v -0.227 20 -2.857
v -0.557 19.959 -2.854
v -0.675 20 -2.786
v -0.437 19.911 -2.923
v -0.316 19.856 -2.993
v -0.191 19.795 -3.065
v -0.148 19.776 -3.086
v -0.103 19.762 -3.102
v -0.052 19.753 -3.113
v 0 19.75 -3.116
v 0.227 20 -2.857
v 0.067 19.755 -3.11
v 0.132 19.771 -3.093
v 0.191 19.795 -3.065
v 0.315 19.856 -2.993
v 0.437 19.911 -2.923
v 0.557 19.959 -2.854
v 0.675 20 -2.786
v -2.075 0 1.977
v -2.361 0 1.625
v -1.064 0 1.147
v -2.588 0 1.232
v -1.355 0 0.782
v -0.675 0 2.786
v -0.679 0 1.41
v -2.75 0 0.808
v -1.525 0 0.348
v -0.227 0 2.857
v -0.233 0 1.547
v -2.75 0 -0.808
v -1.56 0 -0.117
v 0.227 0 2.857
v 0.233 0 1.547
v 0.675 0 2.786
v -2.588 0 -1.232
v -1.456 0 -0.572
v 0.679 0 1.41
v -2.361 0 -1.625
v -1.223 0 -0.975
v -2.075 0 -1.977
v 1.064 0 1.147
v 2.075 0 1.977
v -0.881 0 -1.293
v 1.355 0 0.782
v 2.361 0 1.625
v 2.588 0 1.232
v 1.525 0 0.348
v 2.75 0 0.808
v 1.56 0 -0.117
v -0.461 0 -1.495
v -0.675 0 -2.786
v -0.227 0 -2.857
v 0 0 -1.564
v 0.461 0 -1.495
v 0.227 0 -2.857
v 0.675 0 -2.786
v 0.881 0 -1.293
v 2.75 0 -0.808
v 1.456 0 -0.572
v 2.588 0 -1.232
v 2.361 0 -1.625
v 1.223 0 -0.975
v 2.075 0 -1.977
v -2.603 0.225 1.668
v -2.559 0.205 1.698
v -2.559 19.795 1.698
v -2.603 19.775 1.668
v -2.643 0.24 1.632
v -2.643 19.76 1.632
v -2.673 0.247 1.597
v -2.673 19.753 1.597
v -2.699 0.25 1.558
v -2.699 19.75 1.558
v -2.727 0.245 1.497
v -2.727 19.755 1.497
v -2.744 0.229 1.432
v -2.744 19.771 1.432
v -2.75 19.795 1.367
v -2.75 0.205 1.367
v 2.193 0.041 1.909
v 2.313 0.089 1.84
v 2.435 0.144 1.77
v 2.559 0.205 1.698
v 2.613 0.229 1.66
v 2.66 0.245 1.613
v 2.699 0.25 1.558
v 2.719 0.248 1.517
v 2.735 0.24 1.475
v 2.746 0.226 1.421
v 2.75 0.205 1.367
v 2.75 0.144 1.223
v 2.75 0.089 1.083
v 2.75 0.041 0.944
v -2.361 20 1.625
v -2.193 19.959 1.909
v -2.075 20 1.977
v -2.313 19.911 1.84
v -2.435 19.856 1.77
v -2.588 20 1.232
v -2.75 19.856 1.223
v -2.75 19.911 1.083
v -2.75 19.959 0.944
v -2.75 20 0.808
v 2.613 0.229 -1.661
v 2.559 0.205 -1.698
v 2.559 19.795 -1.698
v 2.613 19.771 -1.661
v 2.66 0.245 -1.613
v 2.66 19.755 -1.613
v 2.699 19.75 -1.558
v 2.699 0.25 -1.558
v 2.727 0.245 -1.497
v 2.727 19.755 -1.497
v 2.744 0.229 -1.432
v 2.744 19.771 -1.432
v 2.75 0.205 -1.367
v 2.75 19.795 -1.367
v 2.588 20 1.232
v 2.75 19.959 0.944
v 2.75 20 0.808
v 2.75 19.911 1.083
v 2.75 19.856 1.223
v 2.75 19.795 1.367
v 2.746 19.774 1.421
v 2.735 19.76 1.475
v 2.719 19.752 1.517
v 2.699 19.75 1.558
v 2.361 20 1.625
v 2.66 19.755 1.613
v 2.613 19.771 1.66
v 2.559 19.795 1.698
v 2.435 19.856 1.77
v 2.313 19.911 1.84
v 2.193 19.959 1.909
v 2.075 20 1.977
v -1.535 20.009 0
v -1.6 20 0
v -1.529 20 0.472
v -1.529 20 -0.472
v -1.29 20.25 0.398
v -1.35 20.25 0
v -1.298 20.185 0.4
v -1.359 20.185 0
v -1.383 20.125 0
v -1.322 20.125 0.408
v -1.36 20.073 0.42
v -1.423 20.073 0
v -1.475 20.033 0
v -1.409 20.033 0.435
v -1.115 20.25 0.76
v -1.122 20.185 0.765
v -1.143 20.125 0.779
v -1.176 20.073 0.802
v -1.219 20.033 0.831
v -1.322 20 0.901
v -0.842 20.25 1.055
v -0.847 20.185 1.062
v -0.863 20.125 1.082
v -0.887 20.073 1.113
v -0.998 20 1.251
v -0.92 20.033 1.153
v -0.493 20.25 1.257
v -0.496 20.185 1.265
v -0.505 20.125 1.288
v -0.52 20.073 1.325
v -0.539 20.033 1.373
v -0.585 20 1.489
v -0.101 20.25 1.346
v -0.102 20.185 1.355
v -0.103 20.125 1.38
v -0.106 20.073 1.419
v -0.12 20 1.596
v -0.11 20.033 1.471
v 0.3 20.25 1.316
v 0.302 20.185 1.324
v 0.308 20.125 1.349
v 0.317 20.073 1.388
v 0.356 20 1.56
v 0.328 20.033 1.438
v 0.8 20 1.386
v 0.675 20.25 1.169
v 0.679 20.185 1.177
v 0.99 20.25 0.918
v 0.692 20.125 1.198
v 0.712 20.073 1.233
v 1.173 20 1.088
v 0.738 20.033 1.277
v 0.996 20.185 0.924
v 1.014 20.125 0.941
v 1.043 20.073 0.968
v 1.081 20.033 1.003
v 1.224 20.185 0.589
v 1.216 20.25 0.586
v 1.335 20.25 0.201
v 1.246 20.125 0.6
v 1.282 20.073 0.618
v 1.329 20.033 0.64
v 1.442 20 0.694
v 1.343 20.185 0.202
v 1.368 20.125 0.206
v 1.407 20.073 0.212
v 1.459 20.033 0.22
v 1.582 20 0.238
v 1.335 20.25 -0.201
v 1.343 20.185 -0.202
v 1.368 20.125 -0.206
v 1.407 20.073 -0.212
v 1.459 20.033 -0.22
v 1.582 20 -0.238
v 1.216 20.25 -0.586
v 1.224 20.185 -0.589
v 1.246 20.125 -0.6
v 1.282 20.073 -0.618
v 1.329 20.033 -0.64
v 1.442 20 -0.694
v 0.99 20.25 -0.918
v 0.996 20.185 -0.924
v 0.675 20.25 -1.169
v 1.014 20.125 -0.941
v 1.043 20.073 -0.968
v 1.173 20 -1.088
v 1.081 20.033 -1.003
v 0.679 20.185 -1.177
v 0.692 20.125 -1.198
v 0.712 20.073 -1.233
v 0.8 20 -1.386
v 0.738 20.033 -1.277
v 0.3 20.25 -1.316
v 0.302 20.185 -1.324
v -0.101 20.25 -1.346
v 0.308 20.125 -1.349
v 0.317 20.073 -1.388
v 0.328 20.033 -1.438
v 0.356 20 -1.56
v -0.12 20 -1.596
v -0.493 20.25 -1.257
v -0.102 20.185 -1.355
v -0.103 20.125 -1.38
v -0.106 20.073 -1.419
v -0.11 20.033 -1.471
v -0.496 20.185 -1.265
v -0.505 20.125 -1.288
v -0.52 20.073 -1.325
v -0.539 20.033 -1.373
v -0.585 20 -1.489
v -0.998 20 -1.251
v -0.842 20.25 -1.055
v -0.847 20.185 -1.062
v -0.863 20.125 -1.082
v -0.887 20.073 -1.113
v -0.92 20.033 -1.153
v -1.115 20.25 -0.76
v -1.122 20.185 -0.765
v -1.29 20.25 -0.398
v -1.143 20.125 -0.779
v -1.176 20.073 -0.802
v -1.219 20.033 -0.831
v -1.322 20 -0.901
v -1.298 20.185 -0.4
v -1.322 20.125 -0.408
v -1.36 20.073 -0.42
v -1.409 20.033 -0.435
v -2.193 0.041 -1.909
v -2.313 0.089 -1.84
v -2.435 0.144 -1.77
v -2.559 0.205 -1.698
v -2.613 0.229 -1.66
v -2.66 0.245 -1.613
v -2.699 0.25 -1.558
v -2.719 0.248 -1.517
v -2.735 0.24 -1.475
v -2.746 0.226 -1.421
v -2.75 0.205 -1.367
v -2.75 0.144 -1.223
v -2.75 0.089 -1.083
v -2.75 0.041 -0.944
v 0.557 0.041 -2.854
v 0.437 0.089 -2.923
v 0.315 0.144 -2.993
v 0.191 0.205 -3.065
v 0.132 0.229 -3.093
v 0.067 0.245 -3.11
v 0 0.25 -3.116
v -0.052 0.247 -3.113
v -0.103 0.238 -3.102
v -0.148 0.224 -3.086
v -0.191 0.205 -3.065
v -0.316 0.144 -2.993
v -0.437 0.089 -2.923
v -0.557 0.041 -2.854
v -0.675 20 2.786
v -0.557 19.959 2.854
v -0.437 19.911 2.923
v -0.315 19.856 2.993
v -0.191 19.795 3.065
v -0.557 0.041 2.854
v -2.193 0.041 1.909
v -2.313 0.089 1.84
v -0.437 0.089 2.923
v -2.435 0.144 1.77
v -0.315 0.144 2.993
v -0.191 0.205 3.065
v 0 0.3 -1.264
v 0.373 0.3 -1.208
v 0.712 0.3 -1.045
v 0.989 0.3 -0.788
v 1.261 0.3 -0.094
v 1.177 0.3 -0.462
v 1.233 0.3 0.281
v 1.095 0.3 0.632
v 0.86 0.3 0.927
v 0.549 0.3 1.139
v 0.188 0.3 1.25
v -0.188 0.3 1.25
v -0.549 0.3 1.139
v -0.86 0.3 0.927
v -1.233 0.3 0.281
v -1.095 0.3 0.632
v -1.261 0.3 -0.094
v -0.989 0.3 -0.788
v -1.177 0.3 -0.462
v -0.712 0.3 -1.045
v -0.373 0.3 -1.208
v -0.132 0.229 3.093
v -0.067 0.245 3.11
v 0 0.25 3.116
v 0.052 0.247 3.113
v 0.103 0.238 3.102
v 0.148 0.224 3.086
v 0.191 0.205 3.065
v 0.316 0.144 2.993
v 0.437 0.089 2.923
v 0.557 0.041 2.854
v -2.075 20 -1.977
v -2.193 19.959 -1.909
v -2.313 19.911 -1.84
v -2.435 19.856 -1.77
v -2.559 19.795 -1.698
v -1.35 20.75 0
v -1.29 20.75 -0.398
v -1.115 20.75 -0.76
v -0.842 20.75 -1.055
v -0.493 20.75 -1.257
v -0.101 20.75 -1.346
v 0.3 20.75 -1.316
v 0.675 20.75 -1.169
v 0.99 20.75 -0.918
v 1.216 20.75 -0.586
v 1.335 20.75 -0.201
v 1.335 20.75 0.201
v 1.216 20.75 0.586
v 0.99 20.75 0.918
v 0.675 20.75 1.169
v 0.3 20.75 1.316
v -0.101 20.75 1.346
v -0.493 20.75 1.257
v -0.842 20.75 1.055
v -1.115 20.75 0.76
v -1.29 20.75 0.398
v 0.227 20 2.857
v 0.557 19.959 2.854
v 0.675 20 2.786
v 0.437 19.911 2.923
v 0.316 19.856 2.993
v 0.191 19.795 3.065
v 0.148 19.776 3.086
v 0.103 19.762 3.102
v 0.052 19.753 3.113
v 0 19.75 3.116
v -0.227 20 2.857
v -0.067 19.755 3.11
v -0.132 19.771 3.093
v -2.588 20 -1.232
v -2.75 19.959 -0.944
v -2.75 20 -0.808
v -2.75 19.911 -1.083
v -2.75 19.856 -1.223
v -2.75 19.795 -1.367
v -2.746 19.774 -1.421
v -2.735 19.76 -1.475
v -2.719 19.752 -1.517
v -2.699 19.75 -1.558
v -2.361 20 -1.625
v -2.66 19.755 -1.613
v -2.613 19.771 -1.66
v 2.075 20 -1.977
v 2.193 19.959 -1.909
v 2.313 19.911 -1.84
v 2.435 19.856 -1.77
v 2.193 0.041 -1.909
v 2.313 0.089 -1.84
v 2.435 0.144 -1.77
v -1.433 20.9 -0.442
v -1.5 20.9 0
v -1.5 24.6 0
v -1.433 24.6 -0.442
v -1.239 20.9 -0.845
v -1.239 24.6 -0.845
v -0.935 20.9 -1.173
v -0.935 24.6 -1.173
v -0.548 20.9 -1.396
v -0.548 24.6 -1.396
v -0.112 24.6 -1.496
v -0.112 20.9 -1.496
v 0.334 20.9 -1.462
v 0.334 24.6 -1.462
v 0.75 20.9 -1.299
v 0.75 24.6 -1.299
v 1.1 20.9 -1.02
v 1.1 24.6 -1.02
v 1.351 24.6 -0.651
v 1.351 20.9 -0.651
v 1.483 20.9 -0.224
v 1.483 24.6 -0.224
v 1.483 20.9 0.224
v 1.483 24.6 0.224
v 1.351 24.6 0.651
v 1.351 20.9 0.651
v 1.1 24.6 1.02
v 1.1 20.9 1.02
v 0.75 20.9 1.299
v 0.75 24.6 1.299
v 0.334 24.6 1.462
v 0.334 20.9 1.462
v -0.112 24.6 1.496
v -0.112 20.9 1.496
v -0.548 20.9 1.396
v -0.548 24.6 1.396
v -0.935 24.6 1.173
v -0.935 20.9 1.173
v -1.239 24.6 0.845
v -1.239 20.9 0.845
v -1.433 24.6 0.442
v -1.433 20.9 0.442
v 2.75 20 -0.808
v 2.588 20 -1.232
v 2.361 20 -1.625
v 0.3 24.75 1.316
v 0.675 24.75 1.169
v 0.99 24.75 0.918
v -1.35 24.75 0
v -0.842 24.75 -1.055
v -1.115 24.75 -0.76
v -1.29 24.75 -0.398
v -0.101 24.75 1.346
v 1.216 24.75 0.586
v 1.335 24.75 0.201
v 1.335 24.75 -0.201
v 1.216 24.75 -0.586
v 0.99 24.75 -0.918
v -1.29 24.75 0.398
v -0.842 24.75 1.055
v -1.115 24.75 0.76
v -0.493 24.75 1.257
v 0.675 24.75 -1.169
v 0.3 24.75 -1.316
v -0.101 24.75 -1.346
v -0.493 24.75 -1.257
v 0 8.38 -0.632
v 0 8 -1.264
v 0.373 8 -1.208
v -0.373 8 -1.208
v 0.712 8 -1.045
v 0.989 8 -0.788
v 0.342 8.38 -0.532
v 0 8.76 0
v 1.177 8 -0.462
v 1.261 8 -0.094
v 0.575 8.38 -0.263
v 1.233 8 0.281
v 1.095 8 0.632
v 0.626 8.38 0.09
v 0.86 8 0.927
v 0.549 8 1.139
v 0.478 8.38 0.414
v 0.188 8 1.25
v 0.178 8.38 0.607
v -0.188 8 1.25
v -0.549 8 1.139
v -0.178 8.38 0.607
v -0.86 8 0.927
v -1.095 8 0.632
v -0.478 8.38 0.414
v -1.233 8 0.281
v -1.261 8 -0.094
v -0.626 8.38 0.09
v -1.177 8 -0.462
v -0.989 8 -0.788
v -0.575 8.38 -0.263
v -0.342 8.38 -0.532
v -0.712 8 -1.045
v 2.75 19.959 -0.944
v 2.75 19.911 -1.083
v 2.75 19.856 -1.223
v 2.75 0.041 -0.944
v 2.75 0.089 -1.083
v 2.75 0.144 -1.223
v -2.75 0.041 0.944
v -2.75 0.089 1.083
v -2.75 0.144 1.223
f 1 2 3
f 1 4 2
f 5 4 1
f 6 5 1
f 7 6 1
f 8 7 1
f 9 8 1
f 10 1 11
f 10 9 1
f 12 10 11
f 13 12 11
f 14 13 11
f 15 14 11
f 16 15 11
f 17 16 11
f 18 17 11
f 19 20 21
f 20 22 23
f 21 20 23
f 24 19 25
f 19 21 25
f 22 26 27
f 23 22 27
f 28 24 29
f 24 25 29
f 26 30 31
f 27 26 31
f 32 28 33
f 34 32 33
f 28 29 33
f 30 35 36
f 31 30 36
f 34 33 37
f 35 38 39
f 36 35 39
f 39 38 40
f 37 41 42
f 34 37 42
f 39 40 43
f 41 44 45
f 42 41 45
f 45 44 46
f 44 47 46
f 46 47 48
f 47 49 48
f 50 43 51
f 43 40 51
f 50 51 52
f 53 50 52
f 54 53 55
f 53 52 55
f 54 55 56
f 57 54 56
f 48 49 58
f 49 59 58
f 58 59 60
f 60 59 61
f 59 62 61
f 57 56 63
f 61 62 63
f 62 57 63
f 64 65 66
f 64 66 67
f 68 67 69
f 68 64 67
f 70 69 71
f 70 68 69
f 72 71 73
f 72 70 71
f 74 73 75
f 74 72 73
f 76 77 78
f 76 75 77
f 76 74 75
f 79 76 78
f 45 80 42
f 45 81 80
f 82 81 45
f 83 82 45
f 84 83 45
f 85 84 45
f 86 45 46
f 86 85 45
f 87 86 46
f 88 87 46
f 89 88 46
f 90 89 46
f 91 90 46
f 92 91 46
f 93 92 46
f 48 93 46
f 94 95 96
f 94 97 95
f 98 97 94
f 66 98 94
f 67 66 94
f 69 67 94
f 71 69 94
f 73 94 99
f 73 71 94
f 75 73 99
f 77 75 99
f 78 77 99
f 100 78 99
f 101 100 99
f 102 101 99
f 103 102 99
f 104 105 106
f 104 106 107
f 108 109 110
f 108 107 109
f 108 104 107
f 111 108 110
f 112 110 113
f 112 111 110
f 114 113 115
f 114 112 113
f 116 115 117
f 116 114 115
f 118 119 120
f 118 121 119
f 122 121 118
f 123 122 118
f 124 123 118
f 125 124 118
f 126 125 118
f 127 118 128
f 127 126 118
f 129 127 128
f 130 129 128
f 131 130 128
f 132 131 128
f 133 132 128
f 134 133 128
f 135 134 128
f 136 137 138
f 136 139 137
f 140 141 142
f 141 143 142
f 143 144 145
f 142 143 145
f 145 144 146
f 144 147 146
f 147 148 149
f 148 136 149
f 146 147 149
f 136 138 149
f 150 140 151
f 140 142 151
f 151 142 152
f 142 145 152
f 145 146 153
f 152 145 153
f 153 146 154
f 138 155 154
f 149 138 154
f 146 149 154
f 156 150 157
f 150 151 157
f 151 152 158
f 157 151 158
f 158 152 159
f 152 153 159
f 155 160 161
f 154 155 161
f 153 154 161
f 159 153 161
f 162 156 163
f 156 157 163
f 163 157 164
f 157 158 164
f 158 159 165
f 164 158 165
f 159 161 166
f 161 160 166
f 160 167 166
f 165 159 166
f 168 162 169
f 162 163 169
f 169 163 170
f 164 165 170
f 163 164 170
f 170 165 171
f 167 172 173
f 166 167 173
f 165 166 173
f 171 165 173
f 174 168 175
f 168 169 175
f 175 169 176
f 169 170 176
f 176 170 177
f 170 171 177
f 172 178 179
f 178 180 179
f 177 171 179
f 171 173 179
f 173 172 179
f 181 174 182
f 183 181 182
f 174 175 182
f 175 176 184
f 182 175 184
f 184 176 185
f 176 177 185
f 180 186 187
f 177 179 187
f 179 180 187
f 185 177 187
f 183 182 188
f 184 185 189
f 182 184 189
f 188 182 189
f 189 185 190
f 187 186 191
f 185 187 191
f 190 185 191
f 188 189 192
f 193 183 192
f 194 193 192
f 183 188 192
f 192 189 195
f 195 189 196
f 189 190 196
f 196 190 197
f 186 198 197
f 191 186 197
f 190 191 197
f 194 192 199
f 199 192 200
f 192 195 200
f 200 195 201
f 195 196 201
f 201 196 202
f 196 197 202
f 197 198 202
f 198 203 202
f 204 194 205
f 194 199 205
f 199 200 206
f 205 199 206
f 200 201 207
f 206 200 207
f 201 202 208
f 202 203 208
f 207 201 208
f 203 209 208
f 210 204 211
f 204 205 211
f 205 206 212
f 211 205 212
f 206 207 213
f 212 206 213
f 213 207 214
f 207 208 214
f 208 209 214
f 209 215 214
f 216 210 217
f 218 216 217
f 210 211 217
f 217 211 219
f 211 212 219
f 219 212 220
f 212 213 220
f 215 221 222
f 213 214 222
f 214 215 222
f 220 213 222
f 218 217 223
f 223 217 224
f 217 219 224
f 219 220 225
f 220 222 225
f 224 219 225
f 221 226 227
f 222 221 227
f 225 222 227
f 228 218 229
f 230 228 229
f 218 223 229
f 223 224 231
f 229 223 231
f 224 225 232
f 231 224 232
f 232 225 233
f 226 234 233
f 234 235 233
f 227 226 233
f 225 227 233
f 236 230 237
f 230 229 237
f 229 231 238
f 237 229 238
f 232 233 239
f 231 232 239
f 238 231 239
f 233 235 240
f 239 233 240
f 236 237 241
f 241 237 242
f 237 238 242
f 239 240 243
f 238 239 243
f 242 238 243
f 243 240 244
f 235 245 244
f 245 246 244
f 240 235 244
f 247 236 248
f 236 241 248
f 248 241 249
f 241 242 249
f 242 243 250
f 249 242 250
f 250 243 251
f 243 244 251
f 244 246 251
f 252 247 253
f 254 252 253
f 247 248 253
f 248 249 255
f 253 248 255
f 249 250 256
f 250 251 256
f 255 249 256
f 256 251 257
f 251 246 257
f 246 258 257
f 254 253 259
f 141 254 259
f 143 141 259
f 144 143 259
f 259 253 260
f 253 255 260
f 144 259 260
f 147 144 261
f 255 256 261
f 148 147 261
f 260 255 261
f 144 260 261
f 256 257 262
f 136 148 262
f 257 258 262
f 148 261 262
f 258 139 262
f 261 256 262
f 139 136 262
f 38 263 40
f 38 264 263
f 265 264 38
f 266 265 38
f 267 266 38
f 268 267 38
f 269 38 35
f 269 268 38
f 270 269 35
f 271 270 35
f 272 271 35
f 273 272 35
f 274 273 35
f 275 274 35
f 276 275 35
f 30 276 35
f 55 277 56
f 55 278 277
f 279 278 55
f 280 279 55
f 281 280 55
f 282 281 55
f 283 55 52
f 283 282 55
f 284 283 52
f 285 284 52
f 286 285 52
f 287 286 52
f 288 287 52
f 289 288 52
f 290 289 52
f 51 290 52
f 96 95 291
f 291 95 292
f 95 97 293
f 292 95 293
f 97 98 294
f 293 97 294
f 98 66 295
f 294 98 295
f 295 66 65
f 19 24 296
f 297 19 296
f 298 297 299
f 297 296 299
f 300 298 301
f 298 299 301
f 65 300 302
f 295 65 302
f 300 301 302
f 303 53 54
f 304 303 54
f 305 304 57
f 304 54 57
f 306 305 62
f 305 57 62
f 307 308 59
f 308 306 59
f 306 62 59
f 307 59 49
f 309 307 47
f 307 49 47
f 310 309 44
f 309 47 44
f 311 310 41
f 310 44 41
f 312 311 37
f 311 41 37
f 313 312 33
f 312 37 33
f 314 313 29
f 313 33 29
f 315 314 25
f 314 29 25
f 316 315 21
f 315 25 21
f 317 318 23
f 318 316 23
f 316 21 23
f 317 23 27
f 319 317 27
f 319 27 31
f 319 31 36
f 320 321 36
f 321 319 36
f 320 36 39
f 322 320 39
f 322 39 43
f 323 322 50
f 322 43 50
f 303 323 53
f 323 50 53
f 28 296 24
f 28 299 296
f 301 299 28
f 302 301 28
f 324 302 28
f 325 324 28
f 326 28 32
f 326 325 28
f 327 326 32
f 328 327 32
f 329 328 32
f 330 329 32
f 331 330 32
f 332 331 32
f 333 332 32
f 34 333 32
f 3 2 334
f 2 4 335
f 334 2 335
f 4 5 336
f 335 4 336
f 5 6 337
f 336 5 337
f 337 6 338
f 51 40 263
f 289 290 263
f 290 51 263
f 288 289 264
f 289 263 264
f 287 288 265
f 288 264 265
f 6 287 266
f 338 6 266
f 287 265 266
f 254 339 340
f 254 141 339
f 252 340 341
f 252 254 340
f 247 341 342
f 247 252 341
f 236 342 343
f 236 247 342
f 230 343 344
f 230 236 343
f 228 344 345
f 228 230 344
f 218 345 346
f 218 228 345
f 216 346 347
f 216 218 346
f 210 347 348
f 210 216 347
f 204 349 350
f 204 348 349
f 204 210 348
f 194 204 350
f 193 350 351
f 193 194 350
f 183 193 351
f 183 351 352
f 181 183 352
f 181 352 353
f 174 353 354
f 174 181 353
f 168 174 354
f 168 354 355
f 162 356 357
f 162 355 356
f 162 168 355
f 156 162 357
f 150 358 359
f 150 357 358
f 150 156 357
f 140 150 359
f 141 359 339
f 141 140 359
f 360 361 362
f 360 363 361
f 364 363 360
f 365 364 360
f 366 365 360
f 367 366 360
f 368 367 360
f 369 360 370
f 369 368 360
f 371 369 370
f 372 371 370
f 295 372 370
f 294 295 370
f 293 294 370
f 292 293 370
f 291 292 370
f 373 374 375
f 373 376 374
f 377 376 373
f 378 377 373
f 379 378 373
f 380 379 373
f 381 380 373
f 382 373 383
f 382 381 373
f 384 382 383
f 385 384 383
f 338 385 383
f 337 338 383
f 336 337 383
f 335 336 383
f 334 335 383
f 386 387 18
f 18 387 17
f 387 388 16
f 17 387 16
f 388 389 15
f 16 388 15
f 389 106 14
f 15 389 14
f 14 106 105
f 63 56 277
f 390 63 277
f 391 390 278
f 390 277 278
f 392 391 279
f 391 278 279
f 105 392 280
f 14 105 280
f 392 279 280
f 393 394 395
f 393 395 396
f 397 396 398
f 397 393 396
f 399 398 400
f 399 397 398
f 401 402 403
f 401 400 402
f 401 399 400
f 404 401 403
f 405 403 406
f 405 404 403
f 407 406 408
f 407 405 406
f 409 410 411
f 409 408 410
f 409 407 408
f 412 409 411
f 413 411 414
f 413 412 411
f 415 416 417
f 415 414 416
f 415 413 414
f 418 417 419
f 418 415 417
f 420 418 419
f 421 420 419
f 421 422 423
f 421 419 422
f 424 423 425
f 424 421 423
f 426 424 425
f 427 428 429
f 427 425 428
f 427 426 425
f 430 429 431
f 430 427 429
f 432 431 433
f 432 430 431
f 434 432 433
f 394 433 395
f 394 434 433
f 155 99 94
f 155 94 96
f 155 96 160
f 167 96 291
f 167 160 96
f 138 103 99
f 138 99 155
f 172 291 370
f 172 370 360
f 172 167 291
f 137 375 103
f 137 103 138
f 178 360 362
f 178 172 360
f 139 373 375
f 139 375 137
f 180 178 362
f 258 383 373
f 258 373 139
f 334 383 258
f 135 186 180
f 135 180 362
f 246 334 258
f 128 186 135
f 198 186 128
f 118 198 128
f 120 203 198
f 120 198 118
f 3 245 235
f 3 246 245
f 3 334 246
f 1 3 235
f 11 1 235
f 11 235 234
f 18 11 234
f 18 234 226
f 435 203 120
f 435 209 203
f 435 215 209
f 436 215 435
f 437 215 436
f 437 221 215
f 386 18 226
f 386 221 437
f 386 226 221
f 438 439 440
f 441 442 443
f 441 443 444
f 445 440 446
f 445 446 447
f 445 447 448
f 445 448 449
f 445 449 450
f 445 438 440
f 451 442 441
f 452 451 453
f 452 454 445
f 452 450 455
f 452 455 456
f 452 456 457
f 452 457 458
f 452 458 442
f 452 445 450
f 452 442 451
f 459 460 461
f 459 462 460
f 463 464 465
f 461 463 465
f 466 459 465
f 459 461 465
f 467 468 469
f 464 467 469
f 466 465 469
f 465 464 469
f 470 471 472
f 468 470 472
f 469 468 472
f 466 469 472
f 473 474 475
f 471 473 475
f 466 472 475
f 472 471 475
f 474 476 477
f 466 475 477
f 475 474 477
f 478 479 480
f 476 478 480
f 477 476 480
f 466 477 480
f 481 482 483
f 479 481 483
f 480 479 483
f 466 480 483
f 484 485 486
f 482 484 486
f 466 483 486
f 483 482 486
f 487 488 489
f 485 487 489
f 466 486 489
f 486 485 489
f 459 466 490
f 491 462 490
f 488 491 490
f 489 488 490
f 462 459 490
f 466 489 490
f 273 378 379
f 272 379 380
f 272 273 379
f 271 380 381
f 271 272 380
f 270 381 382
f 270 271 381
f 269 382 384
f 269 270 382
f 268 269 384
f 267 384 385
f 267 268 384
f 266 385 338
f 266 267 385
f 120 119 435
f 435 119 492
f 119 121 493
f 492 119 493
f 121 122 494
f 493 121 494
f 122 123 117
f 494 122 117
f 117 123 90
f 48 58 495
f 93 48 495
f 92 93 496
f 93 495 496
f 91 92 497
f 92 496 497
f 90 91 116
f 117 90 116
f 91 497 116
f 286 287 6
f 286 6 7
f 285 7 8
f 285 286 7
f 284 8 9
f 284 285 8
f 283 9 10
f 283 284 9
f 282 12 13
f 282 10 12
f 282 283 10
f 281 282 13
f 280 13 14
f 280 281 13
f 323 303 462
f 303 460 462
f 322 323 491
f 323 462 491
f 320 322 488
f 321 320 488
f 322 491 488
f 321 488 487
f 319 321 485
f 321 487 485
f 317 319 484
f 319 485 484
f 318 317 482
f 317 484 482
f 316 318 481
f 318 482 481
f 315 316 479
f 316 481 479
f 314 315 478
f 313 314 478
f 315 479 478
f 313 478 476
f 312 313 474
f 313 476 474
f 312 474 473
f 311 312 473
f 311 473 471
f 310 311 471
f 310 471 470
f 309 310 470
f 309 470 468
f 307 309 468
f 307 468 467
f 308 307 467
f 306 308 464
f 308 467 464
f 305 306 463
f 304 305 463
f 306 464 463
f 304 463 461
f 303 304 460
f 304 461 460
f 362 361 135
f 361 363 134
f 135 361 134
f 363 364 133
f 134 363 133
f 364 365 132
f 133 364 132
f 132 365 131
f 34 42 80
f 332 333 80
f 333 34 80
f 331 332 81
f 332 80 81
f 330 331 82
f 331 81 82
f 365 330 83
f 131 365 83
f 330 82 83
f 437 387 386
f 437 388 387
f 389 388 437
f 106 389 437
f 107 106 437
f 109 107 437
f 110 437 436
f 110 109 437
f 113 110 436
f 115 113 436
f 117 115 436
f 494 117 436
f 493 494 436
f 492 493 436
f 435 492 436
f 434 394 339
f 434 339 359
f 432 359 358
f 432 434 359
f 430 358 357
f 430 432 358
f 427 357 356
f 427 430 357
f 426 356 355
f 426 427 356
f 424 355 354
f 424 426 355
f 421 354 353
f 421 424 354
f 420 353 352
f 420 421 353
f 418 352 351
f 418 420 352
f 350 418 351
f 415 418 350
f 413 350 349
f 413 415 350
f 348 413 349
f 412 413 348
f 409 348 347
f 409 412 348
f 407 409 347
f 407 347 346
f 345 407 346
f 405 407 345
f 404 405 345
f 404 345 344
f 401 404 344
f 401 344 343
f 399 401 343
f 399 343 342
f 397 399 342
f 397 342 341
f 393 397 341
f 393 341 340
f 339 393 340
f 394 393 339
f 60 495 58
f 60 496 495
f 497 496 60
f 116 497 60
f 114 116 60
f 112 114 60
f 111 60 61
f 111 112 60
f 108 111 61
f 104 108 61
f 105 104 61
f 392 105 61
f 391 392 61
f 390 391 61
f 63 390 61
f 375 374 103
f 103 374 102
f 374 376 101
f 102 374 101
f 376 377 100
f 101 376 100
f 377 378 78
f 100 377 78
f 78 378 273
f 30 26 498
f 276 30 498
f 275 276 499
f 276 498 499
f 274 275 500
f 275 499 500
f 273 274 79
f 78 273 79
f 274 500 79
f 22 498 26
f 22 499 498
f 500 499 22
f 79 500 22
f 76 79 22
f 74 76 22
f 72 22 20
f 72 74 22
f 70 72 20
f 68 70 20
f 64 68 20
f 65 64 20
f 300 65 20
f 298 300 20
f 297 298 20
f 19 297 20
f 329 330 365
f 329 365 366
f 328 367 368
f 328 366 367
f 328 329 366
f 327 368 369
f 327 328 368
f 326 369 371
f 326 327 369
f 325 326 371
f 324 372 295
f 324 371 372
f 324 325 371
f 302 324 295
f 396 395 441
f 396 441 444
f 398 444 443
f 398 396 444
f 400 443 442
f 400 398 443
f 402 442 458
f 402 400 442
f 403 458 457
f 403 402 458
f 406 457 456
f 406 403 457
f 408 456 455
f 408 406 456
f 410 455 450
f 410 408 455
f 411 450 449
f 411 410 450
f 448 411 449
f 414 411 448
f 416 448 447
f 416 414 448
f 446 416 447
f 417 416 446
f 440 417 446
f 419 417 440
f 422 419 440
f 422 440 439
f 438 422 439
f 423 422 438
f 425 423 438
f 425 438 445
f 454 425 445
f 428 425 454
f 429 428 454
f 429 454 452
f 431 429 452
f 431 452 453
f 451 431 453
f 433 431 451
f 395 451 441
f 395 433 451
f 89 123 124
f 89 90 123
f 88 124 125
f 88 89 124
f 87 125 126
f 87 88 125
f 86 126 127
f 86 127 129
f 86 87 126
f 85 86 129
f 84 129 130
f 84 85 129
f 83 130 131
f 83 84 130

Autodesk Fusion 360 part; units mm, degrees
sketch "M3 Standoff Profile" plane through (0, 0, 0) normal (0, 1, 0) x (1, 0, 0)
  arc A0 (-2.75, -1.3669) -> (-2.5588, -1.6981) centre (-2.3675, -1.3669) ccw
  arc A1 (0.1912, 3.065) -> (-0.1913, 3.065) centre (0, 2.7338) ccw
  arc A2 (-0.1912, -3.065) -> (0.1913, -3.065) centre (0, -2.7338) ccw
  arc A3 (2.5588, -1.6981) -> (2.75, -1.3669) centre (2.3675, -1.3669) ccw
  line L0 (2.75, -1.3669) -> (2.75, 1.3669)
  line L1 (-2.75, 1.3669) -> (-2.75, -1.3669)
  arc A4 (2.75, 1.3669) -> (2.5588, 1.6981) centre (2.3675, 1.3669) ccw
  line L2 (-0.1913, 3.065) -> (-2.5588, 1.6981)
  line L3 (2.5587, 1.6981) -> (0.1912, 3.065)
  line L4 (-2.5588, -1.6981) -> (-0.1912, -3.065)
  line L5 (0.1913, -3.065) -> (2.5588, -1.6981)
  arc A5 (-2.5588, 1.6981) -> (-2.75, 1.3669) centre (-2.3675, 1.3669) ccw
  line L6 (0, 2.7338) -> (0, -2.7338) construction
  dimension "d28" = 120
  dimension "d29" = 0.3825
  dimension "d30" = 2.75
  dimension "d31" = 5.5
  dimension "d32" = 120
extrude "Extrude1" add sketch "M3 Standoff Profile" along normal blind 20
hole "Hole1" at (0, 0, 0) direction (0, 1, 0) diameter 2.529 depth 8 tip angle 118
ref_plane "WorkPlane1" through (0, 10, 0) normal (0.5, 0, 0.866) x (0.866, 0, -0.5)
sketch "Sketch2" plane through (0, 0, 0) normal (0.5, 0, 0.866) x (0.866, 0, -0.5)
  line L0 (-3.065, 0) -> (-1.6981, 0)
  line L1 (-1.6981, 0) -> (-1.6981, 20)
  line L2 (-1.6981, 20) -> (-3.065, 20)
  line L3 (-3.065, 20) -> (-3.065, 0)
  line L4 (1.6981, 0) -> (3.065, 0)
  line L5 (3.065, 20) -> (1.6981, 20)
  line L6 (1.6981, 20) -> (1.6981, 0)
  line L7 (-3.065, 0) -> (-3.1163, 0)
  line L8 (-3.065, 0) -> (-3.065, 20)
  line L9 (-3.065, 20) -> (-3.1163, 20)
  line L10 (-3.065, 20) -> (-3.065, 0)
  line L11 (3.1163, 0) -> (3.065, 0)
  line L12 (3.1163, 20) -> (3.065, 20)
  line L13 (3.065, 20) -> (3.065, 0) construction
  line L14 (1.6981, 0) -> (1.3669, 0)
  line L15 (1.6981, 0) -> (1.6981, 20)
  line L16 (1.6981, 20) -> (1.3669, 20)
  line L17 (1.3669, 20) -> (1.3669, 0)
  line L18 (3.1163, 0) -> (3.1163, 0.25)
  line L19 (3.1163, 0) -> (2.8663, 0)
  line L20 (2.8663, 0) -> (3.1163, 0.25)
  line L21 (3.1163, 20) -> (2.8663, 20)
  line L22 (3.1163, 20) -> (3.1163, 19.75)
  line L23 (2.8663, 20) -> (3.1163, 19.75)
  dimension "d12" = 0.25
  dimension "d13" = 0.25
  dimension "d14" = 0.25
  dimension "d15" = 0.25
revolve "Revolve1" cut sketch "Sketch2" angle 360 about axis through (0, 1.75, 0) along (0, 1, 0) contours L4 L11 L18 L19 L20 | L5 L12 L21 L22 L23
sketch "Sketch3" plane through (0, 20, 0) normal (0, 1, 0) x (-1, 0, 0)
  arc A0 (-0.6752, -2.7856) -> (0.6752, -2.7856) centre (0, 0) ccw
  line L0 (0.6752, -2.7856) -> (2.0748, -1.9776)
  arc A1 (2.0748, -1.9776) -> (2.75, -0.808) centre (0, 0) ccw
  line L1 (2.75, -0.808) -> (2.75, 0.808)
  arc A2 (2.75, 0.808) -> (2.0748, 1.9776) centre (0, 0) ccw
  line L2 (2.0748, 1.9776) -> (0.6752, 2.7856)
  arc A3 (0.6752, 2.7856) -> (-0.6752, 2.7856) centre (0, 0) ccw
  line L3 (-0.6752, 2.7856) -> (-2.0748, 1.9776)
  arc A4 (-2.0748, 1.9776) -> (-2.75, 0.808) centre (0, 0) ccw
  line L4 (-2.75, 0.808) -> (-2.75, -0.808)
  arc A5 (-2.75, -0.808) -> (-2.0748, -1.9776) centre (0, 0) ccw
  line L5 (-2.0748, -1.9776) -> (-0.6752, -2.7856)
  circle A6 centre (0, 0) radius 1.5
  circle A7 centre (0, 0) radius 1.35
  dimension "d17" = 3
  dimension "d18" = 2.7
extrude "Extrude2" add sketch "Sketch3" along normal blind 0.75 contours A7
extrude "Extrude3" add sketch "Sketch3" along normal blind 4 from surface at 0.75 contours A6 | A7
fillet "Fillet1" radius 0.25 1 edges at (1.2586, 20, 0.4882)
chamfer "Chamfer3" distance 0.15 angle 45 2 edges at (1.3985, 20.75, -0.5424) (1.3985, 24.75, -0.5424)
chamfer "Chamfer3" distance 0.3 angle 45 1 edges at (0.4573, 0, 1.1789)
equation "Thread_Length = 4 mm"
equation "Spacing = 20 mm"
equation "d3 = Spacing"
equation "d22 = Thread_Length"
equation "d30 = Hex_Width / 2"
equation "d31 = d30 * 2"
equation "d32 = d28"
equation "Hex_Width = 5.5 mm"
properties part number "20-4 M-F Standoff"
